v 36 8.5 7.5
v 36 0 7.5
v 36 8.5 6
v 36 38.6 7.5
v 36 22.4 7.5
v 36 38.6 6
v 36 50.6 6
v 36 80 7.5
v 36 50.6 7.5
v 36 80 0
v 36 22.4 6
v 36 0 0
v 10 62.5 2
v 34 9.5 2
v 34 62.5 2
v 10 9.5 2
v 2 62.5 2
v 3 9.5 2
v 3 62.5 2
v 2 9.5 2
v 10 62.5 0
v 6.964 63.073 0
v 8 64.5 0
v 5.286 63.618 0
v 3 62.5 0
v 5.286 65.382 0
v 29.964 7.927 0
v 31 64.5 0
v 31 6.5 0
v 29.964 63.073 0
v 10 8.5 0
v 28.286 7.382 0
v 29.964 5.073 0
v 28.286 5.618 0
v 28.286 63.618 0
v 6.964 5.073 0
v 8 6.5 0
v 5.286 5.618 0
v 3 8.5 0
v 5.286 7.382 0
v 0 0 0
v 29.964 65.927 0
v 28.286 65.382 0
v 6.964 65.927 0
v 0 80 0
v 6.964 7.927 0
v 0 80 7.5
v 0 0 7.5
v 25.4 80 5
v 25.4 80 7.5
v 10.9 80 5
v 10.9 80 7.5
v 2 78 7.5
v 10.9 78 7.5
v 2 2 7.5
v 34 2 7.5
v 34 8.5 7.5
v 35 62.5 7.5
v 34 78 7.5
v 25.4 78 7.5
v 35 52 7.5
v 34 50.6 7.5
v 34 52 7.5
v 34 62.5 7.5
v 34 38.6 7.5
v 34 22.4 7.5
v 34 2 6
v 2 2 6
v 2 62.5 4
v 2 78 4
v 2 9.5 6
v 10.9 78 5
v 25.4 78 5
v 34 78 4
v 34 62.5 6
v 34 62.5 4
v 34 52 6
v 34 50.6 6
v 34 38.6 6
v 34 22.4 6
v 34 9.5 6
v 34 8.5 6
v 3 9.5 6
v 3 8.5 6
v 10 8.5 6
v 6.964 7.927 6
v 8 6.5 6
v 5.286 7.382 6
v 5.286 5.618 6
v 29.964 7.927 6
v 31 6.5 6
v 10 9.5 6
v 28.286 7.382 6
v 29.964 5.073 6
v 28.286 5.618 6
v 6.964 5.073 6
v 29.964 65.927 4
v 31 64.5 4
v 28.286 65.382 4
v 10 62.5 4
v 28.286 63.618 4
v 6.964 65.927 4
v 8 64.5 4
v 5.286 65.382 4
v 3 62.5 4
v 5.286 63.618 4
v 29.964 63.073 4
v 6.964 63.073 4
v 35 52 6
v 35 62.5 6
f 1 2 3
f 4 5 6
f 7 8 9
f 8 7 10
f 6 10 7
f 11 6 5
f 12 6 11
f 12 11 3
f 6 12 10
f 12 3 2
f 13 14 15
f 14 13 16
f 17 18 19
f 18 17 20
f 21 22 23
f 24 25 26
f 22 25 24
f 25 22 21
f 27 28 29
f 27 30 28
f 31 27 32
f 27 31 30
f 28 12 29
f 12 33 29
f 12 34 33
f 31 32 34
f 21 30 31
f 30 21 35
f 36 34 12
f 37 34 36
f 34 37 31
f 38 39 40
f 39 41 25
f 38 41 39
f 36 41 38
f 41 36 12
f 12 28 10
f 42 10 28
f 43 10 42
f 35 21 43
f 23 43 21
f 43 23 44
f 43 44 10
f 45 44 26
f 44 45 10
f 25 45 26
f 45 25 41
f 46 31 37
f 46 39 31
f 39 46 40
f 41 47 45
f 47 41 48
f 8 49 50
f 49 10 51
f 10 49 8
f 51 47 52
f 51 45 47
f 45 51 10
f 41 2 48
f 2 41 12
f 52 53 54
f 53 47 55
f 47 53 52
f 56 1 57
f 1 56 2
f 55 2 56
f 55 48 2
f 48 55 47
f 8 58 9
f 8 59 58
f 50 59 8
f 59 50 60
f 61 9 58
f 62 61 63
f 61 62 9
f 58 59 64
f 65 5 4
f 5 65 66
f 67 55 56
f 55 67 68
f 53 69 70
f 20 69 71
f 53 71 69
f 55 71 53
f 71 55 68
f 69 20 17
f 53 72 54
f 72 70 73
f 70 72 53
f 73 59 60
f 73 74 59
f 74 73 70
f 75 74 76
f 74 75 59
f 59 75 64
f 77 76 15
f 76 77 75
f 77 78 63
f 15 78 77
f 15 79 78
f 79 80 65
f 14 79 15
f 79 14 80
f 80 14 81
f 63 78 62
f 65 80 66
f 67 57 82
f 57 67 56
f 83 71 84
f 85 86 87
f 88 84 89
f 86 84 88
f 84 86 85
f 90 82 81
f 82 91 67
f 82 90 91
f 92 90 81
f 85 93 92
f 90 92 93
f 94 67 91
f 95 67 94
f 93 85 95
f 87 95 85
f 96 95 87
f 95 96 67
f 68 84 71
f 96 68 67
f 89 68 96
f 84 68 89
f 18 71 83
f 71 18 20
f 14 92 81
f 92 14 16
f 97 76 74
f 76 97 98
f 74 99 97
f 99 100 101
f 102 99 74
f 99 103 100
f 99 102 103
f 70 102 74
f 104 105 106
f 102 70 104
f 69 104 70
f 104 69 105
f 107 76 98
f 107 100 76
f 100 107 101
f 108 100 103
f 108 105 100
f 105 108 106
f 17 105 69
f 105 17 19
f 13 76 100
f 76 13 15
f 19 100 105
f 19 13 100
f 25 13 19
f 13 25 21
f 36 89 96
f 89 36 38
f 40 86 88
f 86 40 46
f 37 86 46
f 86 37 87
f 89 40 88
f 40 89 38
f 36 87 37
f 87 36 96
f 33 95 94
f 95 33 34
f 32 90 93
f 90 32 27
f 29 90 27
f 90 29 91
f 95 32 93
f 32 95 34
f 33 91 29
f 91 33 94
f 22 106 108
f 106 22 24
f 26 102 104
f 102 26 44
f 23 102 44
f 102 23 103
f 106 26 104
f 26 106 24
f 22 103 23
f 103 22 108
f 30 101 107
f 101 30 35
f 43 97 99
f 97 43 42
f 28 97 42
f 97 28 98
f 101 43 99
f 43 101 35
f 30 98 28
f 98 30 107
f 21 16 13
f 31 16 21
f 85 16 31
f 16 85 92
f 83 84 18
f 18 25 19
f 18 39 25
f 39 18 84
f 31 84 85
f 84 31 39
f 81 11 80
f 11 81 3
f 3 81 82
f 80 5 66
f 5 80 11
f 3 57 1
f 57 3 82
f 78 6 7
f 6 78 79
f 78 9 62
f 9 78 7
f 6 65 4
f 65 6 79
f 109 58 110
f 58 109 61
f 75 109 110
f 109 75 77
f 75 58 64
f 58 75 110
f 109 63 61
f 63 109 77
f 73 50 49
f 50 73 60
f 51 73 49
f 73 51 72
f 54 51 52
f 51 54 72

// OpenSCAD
baseWidth = 36;    // X
baseLength = 80;   // y
baseHeighth = 2;   // Z
baseThickness = 2;



wallThickness = 2;
wallHeigthNoBase = 7.5;
wallHeighthMinusBase = wallHeigthNoBase-baseThickness;

baseLengthInner = baseLength-(2*wallThickness);
baseWidthInner = baseWidth-(2*wallThickness);

baseSDPadMountHeigth = 4;
screwHoleRadius = 1.5;

//SD card side
screwholeSDX1Offset = wallThickness+3.5+1; //might try .4 instead of 1
screwholeSDX2Offset = screwholeSDX1Offset+23;
screwholeSDY1Offset = wallThickness+3.5+1;

screwwholeSCameraY1Offset = screwholeSDY1Offset+58;

// STEM/Camera Side
baseSTEMPCBSupport = 2;

//GPIO dimensions
GPIOXval = 7;
GPIOYVal = 54;



// translate([]) cube([]);
difference(){

union(){
// Base
cube([baseWidth,baseLength,baseHeighth]);

// WALLS
// SD Card outer wall
translate([0,0,baseThickness]) cube([baseWidth,wallThickness,wallHeighthMinusBase]);

// GPIO Side
translate([0,wallThickness,baseThickness]) cube([wallThickness,baseLengthInner,wallHeighthMinusBase]);

// Ports side (HDMI, USB, etc
translate([baseWidthInner+wallThickness,wallThickness,baseThickness]) cube([wallThickness,baseLengthInner,wallHeighthMinusBase]);

//Camera side aka USB Stem side
translate([0,baseLengthInner+wallThickness,baseThickness]) cube([baseWidth,wallThickness,wallHeighthMinusBase]);

// SD Card side 
// Raspi0w PCB rest
translate([wallThickness,wallThickness,baseThickness]) cube([baseWidthInner,7.5,baseSDPadMountHeigth]);
// Z axis of 4 is height of plate where raspi rests

// STEM/Camera side
translate([wallThickness,screwwholeSCameraY1Offset-2,baseThickness]) cube([baseWidthInner,baseLengthInner-screwwholeSCameraY1Offset+wallThickness+2,baseSTEMPCBSupport]);


} // end union //////////////////////////////////////
/////////////////////////////////////////////////////


//cylinder(h = height, r1 = BottomRadius, r2 = TopRadius, center = true/false);

////////////////////////////////////////////////////
// Cut outs for screws
// SD Card side screws
translate([screwholeSDX1Offset,screwholeSDY1Offset,0]) cylinder(baseThickness+baseSDPadMountHeigth,screwHoleRadius, screwHoleRadius,false);
translate([screwholeSDX2Offset,screwholeSDY1Offset,0]) cylinder(baseThickness+baseSDPadMountHeigth,screwHoleRadius, screwHoleRadius,false);

// STEM/Camera Side screws
translate([screwholeSDX1Offset,screwwholeSCameraY1Offset,0]) cylinder(baseThickness+baseSDPadMountHeigth,screwHoleRadius, screwHoleRadius,false);
translate([screwholeSDX2Offset,screwwholeSCameraY1Offset,0]) cylinder(baseThickness+baseSDPadMountHeigth,screwHoleRadius, screwHoleRadius,false);


////////////////////////////////////////////////////
// Cut out for GPIO
// GPIO cutout will be on bottom
translate([wallThickness+1,wallThickness+6.5,0]) cube([GPIOXval,GPIOYVal,baseThickness+baseSDPadMountHeigth]);

////////////////////////////////////////////////////
// Cut outs for Ports side
// HDMI
translate([baseWidthInner+wallThickness,wallThickness+6.5,baseThickness+baseSDPadMountHeigth]) cube([wallThickness,13.9,1.5]);
    // wallThickness+6.5 is how far in the hole starts
    // 13.9 is the width of the hole for the hdmi connector
    // 1.5 is how tall the cutout will be.  This should go to the top of the wall.

// USB OTG
translate([baseWidthInner+wallThickness,wallThickness+36.6,baseThickness+baseSDPadMountHeigth]) cube([wallThickness,12,1.5]);
    // wallThickness+36.6 is how far in the hole starts

//USB Power
translate([baseWidthInner+wallThickness,wallThickness+50,baseThickness+baseSDPadMountHeigth]) cube([wallThickness*.5,10.5,1.5]);

////////////////////////////////////////////////////
// Cut out for USB Stem
translate([wallThickness+8.9,baseLengthInner+wallThickness,baseThickness+3]) cube([14.5,wallThickness,2.5]);
    // wallThickness+8.9 is how far in the hole starts
    // baseThickness+3 is how high up the hole starts
    // 14.5 is the widtch of the USB connector
    // 2.5 is how tall the cutout will be














} // end difference
